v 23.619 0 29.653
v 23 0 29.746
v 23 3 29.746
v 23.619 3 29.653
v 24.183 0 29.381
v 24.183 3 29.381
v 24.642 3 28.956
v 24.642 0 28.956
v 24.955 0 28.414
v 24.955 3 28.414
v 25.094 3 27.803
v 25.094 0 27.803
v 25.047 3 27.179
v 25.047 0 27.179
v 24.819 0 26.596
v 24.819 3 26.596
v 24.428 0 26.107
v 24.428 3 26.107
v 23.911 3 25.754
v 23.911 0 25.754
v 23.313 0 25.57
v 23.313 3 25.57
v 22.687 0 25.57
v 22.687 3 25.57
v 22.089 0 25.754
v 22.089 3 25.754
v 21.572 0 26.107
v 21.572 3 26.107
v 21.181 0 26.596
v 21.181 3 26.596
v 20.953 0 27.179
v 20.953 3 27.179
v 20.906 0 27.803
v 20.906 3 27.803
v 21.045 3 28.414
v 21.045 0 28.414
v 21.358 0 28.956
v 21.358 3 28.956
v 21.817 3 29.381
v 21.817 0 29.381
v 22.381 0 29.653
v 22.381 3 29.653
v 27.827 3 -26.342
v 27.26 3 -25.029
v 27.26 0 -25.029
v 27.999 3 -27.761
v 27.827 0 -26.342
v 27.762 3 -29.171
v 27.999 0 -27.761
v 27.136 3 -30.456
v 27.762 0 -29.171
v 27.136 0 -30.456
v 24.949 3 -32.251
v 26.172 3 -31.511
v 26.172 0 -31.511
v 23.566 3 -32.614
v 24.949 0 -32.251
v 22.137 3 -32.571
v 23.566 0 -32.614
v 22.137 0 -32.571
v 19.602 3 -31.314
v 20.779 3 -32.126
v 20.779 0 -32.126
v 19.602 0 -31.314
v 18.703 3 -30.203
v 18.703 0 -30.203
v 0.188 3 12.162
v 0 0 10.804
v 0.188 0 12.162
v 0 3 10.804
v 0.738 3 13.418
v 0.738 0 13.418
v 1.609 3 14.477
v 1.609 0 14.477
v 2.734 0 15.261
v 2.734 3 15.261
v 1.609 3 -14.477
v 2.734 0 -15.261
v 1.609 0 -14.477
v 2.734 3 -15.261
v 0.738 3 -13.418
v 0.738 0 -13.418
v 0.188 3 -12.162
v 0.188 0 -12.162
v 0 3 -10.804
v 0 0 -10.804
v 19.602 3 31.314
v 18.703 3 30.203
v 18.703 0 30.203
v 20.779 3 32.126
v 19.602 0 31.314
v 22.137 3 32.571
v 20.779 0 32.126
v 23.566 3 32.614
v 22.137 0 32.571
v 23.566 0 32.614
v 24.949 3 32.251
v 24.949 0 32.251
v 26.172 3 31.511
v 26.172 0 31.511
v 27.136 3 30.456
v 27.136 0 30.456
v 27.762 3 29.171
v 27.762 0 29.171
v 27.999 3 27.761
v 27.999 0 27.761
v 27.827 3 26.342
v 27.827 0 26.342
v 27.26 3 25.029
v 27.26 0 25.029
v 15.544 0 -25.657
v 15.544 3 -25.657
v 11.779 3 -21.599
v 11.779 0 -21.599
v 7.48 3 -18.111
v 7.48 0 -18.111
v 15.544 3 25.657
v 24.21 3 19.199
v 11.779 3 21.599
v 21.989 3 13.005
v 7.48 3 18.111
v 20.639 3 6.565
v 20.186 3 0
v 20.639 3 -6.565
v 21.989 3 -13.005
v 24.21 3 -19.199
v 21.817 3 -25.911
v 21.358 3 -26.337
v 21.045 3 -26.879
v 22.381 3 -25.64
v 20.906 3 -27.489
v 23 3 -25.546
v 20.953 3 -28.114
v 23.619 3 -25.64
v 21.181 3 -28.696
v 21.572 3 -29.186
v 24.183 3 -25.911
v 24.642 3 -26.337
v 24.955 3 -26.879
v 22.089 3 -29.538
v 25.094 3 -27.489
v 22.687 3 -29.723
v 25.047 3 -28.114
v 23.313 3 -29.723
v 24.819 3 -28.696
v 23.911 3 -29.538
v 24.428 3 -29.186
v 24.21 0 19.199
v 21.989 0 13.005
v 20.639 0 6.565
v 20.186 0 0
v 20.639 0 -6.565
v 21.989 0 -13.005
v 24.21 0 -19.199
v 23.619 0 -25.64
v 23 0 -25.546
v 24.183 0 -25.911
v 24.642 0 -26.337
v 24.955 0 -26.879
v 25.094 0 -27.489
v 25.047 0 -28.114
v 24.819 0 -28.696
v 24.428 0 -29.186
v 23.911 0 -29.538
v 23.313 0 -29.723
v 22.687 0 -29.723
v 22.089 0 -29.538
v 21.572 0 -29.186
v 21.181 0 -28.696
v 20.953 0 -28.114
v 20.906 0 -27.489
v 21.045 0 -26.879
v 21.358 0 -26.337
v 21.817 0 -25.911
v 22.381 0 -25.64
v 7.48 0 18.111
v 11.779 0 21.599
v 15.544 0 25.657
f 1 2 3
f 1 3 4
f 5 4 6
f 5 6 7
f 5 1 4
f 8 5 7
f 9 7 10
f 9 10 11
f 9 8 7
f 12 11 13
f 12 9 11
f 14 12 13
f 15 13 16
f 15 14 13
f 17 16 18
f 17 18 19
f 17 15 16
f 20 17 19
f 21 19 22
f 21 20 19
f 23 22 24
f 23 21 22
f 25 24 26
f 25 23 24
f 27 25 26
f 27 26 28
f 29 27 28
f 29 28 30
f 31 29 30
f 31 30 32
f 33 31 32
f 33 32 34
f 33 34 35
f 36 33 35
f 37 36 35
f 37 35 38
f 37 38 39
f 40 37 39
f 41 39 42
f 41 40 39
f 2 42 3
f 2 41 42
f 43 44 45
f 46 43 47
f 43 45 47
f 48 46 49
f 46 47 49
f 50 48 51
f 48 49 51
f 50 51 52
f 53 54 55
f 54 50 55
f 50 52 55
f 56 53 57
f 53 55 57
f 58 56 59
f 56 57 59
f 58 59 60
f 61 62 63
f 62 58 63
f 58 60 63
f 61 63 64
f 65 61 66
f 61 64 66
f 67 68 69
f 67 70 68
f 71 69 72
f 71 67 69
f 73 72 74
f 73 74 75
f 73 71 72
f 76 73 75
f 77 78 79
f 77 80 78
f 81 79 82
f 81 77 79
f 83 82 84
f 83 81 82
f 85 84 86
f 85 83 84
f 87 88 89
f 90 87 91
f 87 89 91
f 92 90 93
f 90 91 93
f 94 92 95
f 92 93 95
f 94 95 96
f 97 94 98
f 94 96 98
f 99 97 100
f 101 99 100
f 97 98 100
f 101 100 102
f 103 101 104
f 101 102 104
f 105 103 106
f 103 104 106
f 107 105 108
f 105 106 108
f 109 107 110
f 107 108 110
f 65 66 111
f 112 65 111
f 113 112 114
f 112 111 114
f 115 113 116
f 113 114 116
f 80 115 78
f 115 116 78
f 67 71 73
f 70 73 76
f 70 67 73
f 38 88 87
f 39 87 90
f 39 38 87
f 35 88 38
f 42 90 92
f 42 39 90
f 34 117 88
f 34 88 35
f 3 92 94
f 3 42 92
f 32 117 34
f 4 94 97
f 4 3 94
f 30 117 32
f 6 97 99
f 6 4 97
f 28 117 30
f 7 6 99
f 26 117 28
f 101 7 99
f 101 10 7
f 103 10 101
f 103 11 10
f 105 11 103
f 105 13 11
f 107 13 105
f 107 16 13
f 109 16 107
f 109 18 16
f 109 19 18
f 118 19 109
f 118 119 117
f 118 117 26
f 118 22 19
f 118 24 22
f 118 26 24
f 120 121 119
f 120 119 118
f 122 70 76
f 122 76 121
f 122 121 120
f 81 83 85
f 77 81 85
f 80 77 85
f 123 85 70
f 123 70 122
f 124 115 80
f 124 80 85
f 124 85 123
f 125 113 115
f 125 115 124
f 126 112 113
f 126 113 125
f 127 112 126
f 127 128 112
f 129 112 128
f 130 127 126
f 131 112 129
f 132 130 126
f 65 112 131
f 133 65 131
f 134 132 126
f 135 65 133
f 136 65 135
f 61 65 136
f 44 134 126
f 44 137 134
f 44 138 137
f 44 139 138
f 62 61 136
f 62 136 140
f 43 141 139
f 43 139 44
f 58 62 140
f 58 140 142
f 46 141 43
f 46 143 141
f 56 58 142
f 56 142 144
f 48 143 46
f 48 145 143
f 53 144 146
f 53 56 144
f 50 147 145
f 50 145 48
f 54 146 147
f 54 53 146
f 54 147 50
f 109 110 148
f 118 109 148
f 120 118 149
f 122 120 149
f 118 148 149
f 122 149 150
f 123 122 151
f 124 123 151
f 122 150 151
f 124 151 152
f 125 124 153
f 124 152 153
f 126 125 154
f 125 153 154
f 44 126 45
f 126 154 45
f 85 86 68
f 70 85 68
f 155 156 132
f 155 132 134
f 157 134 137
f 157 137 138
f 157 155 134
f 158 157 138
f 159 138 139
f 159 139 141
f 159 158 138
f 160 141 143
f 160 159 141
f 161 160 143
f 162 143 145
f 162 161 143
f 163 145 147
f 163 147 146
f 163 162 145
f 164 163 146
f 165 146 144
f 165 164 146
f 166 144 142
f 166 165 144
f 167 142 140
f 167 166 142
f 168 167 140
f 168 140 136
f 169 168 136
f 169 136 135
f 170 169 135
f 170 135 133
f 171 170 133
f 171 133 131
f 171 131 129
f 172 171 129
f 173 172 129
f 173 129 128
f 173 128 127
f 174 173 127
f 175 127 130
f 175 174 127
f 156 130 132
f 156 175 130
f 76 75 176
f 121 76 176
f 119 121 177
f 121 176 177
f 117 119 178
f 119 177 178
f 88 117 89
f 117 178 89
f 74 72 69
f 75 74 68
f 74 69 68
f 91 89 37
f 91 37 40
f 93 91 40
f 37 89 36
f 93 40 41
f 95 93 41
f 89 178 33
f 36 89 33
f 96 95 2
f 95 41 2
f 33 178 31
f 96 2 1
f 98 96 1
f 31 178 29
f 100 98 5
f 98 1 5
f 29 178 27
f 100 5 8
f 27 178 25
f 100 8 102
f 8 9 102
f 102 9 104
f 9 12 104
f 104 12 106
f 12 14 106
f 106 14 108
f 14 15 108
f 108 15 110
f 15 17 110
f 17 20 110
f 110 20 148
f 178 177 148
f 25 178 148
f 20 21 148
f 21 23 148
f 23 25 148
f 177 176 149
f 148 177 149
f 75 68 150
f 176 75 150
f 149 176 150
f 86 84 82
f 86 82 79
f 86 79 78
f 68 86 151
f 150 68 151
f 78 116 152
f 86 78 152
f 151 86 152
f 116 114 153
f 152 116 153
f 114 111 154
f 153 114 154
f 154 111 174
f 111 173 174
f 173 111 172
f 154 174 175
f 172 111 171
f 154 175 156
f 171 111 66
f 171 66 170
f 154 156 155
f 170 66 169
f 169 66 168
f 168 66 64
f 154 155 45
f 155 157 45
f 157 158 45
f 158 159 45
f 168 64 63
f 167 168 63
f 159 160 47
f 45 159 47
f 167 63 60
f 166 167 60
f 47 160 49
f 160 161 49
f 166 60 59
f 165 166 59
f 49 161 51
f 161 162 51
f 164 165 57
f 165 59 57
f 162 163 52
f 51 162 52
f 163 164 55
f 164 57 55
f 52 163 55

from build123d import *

# Parameters (mm, degrees)
SKETCH1_R           = 5
SKETCH1_R_2         = 2.1
BOSS_EXTRUDE1_DEPTH = 3
FILLET1_R           = 5


with BuildPart() as part:
    # Sketch1 → Boss-Extrude1 (new body)
    # profile 1 of 3: a face of its own
    with BuildSketch(Plane(origin=(0, 0, 0), x_dir=(1, 0, 0), z_dir=(0, 1, 0))):
        with BuildLine():
            Line((0, 14), (0, -14))
            ThreePointArc((0, -14), (10.659672329, -20.591511651), (18.703056171, -30.202995218))
            ThreePointArc((18.703056171, -30.202995218), (20.412961628, -23.367686313), (27.260231116, -25.029048724))
            ThreePointArc((27.260231116, -25.029048724), (20.185963894, 0), (27.260231116, 25.029048724))
            ThreePointArc((27.260231116, 25.029048724), (20.412961628, 23.367686313), (18.703056171, 30.202995218))
            ThreePointArc((18.703056171, 30.202995218), (10.659672329, 20.591511651), (0, 14))
        make_face()
    # profile 2 of 3: a face of its own
    with BuildSketch(Plane(origin=(0, 0, 0), x_dir=(1, 0, 0), z_dir=(0, 1, 0))):
        with Locations((23, -27.646381495)):
            Circle(SKETCH1_R)
        with Locations(Location((23, -27.646381495, 0), (0, 0, 270))):
            Circle(SKETCH1_R_2, mode=Mode.SUBTRACT)
    # profile 3 of 3: a face of its own
    with BuildSketch(Plane(origin=(0, 0, 0), x_dir=(1, 0, 0), z_dir=(0, 1, 0))):
        with Locations((23, 27.646381495)):
            Circle(SKETCH1_R)
        with Locations(Location((23, 27.646381495, 0), (0, 0, 270))):
            Circle(SKETCH1_R_2, mode=Mode.SUBTRACT)
    extrude(amount=BOSS_EXTRUDE1_DEPTH)

    # Fillet1
    fillet1_edges = [part.edges().sort_by_distance(p)[0] for p in [
        (0, 1.5, 14),
        (0, 1.5, -14),
    ]]
    fillet(fillet1_edges, radius=FILLET1_R)


solid = part.part
